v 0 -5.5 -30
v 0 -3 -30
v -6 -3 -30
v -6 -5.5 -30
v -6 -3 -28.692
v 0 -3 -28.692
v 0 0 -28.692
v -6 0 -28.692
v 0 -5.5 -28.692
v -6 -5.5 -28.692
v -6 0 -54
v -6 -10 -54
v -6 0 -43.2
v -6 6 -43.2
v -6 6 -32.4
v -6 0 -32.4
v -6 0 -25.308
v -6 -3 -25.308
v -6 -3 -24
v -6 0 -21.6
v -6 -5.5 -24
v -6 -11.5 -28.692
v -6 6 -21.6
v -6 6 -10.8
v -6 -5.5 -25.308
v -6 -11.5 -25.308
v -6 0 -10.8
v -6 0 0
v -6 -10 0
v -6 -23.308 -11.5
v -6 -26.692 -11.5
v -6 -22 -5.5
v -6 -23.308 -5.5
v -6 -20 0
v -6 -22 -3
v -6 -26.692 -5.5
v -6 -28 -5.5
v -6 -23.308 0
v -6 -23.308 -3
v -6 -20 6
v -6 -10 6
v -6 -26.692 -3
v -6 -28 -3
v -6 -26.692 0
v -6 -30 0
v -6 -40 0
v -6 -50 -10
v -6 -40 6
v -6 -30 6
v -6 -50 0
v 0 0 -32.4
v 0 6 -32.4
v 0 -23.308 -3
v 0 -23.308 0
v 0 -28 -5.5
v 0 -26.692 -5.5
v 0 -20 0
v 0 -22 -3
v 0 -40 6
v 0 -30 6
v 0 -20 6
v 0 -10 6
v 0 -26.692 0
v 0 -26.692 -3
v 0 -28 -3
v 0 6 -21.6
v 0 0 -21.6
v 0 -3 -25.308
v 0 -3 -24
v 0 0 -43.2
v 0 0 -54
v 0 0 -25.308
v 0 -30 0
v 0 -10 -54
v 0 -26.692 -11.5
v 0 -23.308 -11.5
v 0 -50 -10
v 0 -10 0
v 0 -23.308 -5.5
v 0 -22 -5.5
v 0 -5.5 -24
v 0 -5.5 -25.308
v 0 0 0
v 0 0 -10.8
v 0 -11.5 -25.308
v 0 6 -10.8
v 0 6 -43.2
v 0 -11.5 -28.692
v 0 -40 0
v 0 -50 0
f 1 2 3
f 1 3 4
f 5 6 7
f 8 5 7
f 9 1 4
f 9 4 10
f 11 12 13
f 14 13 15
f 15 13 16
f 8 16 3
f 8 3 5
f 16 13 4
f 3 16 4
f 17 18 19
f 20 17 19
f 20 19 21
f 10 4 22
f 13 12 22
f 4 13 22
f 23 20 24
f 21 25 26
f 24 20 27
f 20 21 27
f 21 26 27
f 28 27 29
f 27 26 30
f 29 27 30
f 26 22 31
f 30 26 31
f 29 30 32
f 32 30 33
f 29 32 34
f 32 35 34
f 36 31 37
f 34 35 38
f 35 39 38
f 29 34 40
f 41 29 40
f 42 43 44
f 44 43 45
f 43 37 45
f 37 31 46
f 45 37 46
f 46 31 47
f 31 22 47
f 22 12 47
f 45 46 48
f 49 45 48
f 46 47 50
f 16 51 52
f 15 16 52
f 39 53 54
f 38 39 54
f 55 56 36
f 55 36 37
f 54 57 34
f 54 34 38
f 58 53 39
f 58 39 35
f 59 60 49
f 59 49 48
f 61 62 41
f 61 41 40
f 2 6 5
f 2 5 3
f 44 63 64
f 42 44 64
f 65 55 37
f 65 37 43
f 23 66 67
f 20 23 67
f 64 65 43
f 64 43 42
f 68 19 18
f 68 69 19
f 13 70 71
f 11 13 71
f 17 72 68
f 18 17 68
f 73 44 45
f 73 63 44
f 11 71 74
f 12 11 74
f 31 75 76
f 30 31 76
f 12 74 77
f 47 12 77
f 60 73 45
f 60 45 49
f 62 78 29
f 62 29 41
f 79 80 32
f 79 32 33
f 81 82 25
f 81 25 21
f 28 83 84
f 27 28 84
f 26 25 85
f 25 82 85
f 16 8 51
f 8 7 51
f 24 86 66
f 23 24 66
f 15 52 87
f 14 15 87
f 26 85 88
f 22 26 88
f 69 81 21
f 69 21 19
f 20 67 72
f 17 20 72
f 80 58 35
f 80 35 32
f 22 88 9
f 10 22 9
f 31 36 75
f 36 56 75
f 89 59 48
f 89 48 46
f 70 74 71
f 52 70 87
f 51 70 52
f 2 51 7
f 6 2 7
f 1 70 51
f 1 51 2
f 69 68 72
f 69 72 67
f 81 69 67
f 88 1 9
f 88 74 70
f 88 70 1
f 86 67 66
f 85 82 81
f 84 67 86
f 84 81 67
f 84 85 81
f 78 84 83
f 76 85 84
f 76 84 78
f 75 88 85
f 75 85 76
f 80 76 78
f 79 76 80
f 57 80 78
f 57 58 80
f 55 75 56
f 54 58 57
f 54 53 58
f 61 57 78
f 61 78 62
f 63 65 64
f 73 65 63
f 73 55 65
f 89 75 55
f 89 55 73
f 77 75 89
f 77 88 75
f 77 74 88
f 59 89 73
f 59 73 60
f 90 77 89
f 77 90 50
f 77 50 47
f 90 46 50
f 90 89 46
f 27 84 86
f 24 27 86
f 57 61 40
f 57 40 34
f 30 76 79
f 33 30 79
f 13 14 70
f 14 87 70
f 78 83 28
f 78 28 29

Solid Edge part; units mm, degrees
sketch "Sketch1" plane through (0, 0, 0) normal (1, 0, 0) x (0, 1, 0)
  line L0 (0, 0) -> (-10, 0)
  line L1 (-10, 0) -> (-10, 6)
  line L2 (-10, 6) -> (-20, 6)
  line L3 (-20, 6) -> (-20, 0)
  line L4 (-20, 0) -> (-23.3082, 0)
  line L5 (-23.3082, -3) -> (-23.3082, 0)
  line L6 (-23.3082, -3) -> (-22, -3)
  line L7 (-22, -3) -> (-22, -5.5)
  line L8 (-22, -5.5) -> (-23.3082, -5.5)
  line L9 (-23.3082, -11.5) -> (-23.3082, -5.5)
  line L10 (-26.6918, -11.5) -> (-23.3082, -11.5)
  line L11 (-26.6918, -5.5) -> (-26.6918, -11.5)
  line L12 (-26.6918, -5.5) -> (-28, -5.5)
  line L13 (-28, -5.5) -> (-28, -3)
  line L14 (-28, -3) -> (-26.6918, -3)
  line L15 (-26.6918, 0) -> (-26.6918, -3)
  line L16 (-26.6918, 0) -> (-30, 0)
  line L17 (-30, 0) -> (-30, 6)
  line L18 (-30, 6) -> (-40, 6)
  line L19 (-40, 6) -> (-40, 0)
  line L20 (-40, 0) -> (-50, 0)
  line L21 (-50, 0) -> (-50, -10)
  line L22 (-10, -54) -> (-50, -10)
  line L23 (0, -54) -> (-10, -54)
  line L24 (0, -43.2) -> (0, -54)
  line L25 (6, -43.2) -> (0, -43.2)
  line L26 (6, -32.4) -> (6, -43.2)
  line L27 (0, -32.4) -> (6, -32.4)
  line L28 (0, -28.6918) -> (0, -32.4)
  line L29 (-3, -28.6918) -> (0, -28.6918)
  line L30 (-3, -28.6918) -> (-3, -30)
  line L31 (-3, -30) -> (-5.5, -30)
  line L32 (-5.5, -30) -> (-5.5, -28.6918)
  line L33 (-11.5, -28.6918) -> (-5.5, -28.6918)
  line L34 (-11.5, -25.3082) -> (-11.5, -28.6918)
  line L35 (-5.5, -25.3082) -> (-11.5, -25.3082)
  line L36 (-5.5, -25.3082) -> (-5.5, -24)
  line L37 (-5.5, -24) -> (-3, -24)
  line L38 (-3, -24) -> (-3, -25.3082)
  line L39 (0, -25.3082) -> (-3, -25.3082)
  line L40 (0, -21.6) -> (0, -25.3082)
  line L41 (6, -21.6) -> (0, -21.6)
  line L42 (6, -10.8) -> (6, -21.6)
  line L43 (0, -10.8) -> (6, -10.8)
  line L44 (0, 0) -> (0, -10.8)
extrude "Protrusion1" add sketch "Sketch1" against normal blind 6
